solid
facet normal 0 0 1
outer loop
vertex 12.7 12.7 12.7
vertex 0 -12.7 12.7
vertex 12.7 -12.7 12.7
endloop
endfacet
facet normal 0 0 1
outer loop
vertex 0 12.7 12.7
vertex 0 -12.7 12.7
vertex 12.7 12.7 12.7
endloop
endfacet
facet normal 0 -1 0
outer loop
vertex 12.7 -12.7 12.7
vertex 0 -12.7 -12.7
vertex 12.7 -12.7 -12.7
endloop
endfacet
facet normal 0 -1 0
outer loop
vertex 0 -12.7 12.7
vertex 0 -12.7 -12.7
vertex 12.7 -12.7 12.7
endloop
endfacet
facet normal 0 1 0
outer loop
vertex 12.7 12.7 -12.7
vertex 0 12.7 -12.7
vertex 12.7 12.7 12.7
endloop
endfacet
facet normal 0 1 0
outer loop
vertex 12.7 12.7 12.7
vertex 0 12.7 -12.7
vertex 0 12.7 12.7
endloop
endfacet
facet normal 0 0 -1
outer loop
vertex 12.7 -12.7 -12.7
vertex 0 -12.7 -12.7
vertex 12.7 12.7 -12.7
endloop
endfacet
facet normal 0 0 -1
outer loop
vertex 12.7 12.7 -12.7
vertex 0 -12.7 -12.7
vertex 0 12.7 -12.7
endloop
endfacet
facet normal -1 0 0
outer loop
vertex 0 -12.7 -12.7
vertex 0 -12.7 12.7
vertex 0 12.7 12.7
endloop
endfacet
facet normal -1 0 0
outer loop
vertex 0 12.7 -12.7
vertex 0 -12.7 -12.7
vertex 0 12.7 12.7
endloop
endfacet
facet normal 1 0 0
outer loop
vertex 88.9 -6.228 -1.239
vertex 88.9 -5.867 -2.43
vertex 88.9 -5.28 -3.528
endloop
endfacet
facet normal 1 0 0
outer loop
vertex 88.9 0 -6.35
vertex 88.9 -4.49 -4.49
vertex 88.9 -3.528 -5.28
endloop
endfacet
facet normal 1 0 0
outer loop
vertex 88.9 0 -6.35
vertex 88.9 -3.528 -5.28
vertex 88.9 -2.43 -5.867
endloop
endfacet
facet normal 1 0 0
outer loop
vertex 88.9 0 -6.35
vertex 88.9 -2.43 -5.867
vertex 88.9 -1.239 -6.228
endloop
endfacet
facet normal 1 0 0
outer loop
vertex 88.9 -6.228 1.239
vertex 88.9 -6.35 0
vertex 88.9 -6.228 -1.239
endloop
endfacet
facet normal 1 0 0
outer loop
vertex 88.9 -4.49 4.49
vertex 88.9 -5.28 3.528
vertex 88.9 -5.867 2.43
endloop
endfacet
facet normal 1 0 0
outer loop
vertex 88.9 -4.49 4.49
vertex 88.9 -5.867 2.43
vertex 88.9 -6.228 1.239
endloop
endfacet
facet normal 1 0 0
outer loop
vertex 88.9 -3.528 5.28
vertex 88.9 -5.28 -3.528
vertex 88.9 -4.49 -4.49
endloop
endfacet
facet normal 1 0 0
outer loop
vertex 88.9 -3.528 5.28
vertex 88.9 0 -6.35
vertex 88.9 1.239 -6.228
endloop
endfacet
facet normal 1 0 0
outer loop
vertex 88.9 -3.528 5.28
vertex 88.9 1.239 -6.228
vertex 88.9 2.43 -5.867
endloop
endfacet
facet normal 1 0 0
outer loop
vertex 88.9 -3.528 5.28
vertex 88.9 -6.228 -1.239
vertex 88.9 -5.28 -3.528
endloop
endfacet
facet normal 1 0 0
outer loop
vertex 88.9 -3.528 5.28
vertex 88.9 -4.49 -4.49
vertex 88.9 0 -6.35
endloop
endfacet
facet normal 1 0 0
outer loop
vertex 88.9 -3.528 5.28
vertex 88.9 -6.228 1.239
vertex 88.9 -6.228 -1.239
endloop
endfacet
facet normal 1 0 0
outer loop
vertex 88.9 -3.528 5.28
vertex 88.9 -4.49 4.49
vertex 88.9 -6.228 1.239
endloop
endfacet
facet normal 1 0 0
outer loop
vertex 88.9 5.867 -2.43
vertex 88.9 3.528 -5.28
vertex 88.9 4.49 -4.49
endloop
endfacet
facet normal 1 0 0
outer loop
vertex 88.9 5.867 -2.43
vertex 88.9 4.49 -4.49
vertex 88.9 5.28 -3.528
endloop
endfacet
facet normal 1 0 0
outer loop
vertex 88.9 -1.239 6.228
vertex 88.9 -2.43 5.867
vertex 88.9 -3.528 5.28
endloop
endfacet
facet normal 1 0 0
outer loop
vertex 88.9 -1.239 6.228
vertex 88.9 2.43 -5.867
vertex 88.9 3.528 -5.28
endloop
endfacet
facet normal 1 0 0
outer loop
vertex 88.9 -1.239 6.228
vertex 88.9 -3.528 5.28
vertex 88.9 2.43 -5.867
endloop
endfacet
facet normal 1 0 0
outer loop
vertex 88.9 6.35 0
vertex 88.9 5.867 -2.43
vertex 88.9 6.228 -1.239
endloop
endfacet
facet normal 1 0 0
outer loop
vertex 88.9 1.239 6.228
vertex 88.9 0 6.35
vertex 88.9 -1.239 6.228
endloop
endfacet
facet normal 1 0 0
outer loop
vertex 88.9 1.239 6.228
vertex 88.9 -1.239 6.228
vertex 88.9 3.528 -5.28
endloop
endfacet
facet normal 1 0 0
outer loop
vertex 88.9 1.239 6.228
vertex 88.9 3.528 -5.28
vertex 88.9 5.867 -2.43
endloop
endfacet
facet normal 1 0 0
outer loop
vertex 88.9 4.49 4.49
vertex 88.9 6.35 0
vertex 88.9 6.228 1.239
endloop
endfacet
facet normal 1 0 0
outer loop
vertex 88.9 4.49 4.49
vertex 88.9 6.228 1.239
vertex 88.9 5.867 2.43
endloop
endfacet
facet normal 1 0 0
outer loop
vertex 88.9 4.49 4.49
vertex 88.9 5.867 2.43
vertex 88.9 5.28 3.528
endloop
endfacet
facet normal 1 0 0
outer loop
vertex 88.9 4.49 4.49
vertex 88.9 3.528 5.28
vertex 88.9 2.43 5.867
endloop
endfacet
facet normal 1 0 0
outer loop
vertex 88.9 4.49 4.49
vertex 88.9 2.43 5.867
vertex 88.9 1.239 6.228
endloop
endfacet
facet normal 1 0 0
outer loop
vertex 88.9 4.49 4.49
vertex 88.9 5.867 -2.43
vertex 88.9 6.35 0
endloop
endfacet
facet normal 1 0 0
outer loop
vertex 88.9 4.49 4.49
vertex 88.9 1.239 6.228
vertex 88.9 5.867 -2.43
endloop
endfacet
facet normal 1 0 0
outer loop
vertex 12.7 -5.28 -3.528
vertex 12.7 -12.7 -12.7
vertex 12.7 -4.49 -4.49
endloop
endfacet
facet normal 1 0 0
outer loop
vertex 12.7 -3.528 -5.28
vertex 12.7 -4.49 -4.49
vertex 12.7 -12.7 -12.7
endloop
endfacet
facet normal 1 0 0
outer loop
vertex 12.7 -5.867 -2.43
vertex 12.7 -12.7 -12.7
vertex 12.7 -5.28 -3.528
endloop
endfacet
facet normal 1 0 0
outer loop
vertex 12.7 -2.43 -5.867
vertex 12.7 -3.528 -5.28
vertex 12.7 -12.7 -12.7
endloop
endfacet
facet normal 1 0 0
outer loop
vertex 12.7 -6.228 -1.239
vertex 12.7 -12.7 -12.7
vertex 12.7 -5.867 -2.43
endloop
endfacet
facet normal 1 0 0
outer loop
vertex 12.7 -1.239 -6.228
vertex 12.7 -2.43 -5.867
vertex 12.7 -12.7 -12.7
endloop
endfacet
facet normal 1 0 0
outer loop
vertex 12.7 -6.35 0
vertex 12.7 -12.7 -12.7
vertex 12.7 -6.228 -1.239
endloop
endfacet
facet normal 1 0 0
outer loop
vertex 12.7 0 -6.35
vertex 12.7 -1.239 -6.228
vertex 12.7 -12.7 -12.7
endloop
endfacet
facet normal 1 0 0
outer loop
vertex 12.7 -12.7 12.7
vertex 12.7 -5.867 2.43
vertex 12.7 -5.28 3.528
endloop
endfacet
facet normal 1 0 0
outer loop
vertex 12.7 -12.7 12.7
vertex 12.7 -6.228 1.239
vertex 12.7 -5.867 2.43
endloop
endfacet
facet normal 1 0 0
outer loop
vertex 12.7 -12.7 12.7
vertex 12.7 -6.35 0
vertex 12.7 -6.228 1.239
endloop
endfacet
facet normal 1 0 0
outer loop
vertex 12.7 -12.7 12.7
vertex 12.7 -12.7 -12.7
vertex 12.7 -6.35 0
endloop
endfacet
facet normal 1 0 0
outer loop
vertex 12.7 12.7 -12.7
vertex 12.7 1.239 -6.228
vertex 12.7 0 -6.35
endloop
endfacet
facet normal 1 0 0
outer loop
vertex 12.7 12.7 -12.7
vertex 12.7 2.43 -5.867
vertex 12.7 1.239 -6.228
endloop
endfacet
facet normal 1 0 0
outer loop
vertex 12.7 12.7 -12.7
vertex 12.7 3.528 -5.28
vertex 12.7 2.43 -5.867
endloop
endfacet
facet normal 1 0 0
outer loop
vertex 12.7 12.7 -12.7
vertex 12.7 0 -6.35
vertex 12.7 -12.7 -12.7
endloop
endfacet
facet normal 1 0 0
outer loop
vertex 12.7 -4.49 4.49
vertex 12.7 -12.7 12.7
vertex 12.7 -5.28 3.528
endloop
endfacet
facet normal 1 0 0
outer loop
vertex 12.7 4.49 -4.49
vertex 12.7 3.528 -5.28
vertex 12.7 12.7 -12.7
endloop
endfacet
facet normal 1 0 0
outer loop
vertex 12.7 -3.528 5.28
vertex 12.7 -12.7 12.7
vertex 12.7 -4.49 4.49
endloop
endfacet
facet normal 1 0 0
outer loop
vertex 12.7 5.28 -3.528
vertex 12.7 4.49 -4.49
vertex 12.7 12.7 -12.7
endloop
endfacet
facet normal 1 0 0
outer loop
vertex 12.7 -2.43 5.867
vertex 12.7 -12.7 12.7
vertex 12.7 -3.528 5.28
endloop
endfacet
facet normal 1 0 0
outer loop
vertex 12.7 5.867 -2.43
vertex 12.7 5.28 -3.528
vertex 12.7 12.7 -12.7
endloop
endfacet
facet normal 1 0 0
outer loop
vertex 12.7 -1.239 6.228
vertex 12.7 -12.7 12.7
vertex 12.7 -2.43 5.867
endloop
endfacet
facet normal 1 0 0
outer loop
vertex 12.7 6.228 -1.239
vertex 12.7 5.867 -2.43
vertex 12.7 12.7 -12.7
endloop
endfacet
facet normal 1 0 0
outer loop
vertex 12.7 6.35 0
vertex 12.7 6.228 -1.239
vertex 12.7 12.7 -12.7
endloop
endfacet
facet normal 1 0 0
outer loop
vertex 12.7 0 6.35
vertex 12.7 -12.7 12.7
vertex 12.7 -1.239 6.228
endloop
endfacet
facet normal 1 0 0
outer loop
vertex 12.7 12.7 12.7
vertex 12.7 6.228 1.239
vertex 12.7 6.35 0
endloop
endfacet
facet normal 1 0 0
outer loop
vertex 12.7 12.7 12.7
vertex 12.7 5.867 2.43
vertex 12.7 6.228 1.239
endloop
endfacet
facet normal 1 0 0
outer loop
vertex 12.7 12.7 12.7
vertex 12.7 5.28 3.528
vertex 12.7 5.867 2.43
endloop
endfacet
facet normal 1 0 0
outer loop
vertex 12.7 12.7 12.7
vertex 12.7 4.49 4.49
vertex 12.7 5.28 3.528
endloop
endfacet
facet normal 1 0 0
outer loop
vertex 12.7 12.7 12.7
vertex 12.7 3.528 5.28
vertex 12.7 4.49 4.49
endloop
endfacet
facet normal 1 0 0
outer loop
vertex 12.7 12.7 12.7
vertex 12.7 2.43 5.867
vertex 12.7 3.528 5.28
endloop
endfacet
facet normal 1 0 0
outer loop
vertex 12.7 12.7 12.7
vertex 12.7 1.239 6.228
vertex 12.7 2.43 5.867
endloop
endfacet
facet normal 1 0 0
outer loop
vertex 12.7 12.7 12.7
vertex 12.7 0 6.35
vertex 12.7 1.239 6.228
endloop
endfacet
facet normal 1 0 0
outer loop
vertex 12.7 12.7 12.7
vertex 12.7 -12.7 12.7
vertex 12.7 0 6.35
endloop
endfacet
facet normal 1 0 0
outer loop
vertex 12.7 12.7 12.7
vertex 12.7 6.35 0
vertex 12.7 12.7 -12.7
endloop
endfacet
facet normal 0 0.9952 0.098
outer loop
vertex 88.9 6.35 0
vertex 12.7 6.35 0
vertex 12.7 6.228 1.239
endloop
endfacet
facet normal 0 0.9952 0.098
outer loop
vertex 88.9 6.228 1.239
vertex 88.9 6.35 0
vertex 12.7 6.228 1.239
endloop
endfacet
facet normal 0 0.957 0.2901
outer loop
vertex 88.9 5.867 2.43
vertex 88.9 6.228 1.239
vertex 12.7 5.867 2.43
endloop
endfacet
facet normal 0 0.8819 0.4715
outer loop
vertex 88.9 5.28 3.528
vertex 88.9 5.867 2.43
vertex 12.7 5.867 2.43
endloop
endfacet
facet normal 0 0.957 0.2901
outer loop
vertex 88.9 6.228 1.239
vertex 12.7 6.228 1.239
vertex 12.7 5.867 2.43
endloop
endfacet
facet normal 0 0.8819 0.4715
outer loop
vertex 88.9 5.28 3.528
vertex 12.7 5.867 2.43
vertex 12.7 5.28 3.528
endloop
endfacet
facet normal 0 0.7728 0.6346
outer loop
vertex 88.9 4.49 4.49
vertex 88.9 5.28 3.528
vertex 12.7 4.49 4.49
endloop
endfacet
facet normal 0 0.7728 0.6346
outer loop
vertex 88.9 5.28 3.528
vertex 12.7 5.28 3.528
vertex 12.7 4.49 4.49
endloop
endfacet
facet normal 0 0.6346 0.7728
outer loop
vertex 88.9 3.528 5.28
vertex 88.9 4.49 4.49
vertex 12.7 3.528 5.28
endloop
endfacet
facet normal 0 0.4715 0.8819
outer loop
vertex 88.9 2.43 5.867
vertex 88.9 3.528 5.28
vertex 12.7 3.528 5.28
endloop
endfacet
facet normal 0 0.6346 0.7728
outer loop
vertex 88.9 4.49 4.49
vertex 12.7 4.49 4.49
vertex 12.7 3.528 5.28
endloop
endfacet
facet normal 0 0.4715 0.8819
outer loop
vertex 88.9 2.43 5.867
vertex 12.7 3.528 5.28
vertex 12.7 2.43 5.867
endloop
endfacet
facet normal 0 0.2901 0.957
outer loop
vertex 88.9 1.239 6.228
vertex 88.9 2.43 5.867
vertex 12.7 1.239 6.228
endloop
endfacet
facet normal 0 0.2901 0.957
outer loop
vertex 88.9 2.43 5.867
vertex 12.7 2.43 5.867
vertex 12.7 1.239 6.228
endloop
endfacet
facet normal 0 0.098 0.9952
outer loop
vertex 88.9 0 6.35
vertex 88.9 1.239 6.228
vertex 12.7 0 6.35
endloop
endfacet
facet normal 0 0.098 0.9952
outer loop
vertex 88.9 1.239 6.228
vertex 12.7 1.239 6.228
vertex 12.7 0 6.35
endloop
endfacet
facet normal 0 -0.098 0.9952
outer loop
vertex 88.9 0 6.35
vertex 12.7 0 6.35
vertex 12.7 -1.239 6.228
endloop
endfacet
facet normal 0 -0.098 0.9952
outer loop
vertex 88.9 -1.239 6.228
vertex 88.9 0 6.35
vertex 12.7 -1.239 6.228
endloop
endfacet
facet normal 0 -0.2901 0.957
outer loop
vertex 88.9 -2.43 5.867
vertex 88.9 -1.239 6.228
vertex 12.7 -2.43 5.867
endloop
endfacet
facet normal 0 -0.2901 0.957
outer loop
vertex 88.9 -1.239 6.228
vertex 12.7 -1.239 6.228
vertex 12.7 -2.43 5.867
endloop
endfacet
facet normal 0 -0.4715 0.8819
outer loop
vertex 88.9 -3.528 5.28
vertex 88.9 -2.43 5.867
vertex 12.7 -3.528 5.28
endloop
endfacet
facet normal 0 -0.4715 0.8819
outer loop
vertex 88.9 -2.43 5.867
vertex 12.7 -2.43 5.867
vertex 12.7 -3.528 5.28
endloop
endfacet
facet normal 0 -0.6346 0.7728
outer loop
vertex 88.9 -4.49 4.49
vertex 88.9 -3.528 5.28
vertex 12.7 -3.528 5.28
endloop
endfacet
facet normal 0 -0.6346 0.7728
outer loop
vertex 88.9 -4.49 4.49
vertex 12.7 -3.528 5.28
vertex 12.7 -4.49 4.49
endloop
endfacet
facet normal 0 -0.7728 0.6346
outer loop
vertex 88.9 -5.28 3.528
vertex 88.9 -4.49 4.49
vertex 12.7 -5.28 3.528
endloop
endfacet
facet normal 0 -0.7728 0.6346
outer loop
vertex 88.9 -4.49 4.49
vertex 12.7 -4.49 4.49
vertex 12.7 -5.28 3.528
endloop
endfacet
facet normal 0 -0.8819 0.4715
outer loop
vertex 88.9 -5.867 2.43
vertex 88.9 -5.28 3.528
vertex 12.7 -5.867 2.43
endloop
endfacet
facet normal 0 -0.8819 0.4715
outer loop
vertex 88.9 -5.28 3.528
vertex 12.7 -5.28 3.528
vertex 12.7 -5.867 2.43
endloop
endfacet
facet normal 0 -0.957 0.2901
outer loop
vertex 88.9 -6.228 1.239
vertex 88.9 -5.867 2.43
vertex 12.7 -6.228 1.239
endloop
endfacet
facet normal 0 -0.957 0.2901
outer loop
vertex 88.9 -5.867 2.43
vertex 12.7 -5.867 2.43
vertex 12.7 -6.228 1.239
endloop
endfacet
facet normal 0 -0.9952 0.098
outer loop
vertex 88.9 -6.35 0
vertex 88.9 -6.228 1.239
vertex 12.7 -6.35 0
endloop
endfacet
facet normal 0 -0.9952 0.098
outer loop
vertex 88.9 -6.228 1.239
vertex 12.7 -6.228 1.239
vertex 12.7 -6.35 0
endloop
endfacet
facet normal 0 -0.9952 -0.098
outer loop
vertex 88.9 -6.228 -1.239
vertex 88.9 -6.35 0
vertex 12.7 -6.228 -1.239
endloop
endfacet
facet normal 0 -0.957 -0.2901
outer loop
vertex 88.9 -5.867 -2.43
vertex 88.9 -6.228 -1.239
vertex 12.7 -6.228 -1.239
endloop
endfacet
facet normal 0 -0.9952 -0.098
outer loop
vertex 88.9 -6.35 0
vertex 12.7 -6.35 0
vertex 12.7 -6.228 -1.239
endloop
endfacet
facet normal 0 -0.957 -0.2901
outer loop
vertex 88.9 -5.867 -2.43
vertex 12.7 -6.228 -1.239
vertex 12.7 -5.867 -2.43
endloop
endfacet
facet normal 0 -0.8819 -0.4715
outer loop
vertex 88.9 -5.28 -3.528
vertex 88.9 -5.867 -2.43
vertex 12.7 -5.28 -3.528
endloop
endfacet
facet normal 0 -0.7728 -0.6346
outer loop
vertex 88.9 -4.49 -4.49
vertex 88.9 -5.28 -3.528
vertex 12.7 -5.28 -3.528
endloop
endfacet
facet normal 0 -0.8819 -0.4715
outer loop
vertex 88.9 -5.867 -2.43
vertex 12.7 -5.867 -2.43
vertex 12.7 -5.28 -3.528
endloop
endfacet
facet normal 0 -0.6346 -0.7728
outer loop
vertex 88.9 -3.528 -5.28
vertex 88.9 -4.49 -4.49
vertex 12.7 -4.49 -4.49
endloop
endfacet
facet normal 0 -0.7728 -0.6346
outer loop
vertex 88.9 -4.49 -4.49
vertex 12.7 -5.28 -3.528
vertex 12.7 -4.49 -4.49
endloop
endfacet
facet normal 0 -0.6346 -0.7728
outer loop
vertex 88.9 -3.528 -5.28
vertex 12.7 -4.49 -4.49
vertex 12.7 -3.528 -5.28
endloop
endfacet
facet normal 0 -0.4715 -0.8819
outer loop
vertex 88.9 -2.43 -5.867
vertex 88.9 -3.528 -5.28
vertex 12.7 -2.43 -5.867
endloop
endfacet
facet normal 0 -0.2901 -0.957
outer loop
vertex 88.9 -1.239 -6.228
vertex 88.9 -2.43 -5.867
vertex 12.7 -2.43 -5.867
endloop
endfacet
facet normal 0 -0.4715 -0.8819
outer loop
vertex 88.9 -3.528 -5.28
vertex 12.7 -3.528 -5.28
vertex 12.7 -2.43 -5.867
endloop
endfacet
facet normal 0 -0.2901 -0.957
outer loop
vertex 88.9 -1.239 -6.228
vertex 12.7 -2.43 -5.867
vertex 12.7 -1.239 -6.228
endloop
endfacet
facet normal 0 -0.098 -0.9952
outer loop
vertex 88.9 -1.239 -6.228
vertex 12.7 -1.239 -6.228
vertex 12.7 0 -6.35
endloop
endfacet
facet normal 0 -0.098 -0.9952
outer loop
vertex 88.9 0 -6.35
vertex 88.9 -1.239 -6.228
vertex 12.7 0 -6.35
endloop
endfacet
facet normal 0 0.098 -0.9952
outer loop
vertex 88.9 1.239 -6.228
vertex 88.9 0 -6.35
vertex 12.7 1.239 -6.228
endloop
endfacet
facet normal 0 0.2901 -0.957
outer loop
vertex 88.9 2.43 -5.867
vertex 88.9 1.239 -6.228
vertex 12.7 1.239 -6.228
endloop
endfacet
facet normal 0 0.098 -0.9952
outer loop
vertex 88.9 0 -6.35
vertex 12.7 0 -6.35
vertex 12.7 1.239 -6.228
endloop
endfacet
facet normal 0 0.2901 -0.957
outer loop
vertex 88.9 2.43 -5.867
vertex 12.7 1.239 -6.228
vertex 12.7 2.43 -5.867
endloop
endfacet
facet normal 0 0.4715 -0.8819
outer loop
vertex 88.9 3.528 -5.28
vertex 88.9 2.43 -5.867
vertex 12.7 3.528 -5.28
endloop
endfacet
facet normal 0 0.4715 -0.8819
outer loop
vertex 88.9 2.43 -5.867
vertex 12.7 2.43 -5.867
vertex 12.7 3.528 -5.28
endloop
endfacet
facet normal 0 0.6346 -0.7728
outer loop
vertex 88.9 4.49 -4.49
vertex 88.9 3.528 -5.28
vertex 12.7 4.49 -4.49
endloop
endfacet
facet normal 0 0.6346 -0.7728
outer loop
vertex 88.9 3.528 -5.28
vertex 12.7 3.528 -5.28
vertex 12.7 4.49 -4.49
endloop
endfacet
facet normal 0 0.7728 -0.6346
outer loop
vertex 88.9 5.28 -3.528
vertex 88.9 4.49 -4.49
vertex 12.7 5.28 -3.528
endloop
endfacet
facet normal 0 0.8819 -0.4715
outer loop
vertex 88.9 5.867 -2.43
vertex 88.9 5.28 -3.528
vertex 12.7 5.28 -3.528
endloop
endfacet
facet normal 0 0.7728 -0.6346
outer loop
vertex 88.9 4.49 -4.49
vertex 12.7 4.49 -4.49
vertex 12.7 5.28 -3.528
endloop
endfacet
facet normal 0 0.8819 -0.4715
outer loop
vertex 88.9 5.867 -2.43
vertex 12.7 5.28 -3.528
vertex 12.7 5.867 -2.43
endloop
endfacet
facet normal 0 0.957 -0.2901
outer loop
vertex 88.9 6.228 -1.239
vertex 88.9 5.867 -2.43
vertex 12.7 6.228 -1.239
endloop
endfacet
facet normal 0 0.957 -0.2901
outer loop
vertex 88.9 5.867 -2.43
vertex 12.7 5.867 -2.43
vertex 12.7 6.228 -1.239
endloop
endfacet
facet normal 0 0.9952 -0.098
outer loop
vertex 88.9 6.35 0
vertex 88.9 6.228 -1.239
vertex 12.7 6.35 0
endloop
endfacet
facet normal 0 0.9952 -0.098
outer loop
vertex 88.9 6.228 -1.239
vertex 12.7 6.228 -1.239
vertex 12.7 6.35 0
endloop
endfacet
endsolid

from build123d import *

# Parameters (mm, degrees)
F0_W     = 25.4
F0_H     = 25.4
F1_DEPTH = 12.7
F2_R     = 6.35
F3_DEPTH = 76.2


with BuildPart() as f1:
    # F0 (on Right) → F1 (new body)
    with BuildSketch(Plane.YZ):
        Rectangle(F0_W, F0_H)
    extrude(amount=F1_DEPTH)

    # F2 (on face) → F3 (join)
    with BuildSketch(Plane.YZ.offset(12.7)):
        Circle(F2_R)
    extrude(amount=F3_DEPTH)


solid = f1.part
